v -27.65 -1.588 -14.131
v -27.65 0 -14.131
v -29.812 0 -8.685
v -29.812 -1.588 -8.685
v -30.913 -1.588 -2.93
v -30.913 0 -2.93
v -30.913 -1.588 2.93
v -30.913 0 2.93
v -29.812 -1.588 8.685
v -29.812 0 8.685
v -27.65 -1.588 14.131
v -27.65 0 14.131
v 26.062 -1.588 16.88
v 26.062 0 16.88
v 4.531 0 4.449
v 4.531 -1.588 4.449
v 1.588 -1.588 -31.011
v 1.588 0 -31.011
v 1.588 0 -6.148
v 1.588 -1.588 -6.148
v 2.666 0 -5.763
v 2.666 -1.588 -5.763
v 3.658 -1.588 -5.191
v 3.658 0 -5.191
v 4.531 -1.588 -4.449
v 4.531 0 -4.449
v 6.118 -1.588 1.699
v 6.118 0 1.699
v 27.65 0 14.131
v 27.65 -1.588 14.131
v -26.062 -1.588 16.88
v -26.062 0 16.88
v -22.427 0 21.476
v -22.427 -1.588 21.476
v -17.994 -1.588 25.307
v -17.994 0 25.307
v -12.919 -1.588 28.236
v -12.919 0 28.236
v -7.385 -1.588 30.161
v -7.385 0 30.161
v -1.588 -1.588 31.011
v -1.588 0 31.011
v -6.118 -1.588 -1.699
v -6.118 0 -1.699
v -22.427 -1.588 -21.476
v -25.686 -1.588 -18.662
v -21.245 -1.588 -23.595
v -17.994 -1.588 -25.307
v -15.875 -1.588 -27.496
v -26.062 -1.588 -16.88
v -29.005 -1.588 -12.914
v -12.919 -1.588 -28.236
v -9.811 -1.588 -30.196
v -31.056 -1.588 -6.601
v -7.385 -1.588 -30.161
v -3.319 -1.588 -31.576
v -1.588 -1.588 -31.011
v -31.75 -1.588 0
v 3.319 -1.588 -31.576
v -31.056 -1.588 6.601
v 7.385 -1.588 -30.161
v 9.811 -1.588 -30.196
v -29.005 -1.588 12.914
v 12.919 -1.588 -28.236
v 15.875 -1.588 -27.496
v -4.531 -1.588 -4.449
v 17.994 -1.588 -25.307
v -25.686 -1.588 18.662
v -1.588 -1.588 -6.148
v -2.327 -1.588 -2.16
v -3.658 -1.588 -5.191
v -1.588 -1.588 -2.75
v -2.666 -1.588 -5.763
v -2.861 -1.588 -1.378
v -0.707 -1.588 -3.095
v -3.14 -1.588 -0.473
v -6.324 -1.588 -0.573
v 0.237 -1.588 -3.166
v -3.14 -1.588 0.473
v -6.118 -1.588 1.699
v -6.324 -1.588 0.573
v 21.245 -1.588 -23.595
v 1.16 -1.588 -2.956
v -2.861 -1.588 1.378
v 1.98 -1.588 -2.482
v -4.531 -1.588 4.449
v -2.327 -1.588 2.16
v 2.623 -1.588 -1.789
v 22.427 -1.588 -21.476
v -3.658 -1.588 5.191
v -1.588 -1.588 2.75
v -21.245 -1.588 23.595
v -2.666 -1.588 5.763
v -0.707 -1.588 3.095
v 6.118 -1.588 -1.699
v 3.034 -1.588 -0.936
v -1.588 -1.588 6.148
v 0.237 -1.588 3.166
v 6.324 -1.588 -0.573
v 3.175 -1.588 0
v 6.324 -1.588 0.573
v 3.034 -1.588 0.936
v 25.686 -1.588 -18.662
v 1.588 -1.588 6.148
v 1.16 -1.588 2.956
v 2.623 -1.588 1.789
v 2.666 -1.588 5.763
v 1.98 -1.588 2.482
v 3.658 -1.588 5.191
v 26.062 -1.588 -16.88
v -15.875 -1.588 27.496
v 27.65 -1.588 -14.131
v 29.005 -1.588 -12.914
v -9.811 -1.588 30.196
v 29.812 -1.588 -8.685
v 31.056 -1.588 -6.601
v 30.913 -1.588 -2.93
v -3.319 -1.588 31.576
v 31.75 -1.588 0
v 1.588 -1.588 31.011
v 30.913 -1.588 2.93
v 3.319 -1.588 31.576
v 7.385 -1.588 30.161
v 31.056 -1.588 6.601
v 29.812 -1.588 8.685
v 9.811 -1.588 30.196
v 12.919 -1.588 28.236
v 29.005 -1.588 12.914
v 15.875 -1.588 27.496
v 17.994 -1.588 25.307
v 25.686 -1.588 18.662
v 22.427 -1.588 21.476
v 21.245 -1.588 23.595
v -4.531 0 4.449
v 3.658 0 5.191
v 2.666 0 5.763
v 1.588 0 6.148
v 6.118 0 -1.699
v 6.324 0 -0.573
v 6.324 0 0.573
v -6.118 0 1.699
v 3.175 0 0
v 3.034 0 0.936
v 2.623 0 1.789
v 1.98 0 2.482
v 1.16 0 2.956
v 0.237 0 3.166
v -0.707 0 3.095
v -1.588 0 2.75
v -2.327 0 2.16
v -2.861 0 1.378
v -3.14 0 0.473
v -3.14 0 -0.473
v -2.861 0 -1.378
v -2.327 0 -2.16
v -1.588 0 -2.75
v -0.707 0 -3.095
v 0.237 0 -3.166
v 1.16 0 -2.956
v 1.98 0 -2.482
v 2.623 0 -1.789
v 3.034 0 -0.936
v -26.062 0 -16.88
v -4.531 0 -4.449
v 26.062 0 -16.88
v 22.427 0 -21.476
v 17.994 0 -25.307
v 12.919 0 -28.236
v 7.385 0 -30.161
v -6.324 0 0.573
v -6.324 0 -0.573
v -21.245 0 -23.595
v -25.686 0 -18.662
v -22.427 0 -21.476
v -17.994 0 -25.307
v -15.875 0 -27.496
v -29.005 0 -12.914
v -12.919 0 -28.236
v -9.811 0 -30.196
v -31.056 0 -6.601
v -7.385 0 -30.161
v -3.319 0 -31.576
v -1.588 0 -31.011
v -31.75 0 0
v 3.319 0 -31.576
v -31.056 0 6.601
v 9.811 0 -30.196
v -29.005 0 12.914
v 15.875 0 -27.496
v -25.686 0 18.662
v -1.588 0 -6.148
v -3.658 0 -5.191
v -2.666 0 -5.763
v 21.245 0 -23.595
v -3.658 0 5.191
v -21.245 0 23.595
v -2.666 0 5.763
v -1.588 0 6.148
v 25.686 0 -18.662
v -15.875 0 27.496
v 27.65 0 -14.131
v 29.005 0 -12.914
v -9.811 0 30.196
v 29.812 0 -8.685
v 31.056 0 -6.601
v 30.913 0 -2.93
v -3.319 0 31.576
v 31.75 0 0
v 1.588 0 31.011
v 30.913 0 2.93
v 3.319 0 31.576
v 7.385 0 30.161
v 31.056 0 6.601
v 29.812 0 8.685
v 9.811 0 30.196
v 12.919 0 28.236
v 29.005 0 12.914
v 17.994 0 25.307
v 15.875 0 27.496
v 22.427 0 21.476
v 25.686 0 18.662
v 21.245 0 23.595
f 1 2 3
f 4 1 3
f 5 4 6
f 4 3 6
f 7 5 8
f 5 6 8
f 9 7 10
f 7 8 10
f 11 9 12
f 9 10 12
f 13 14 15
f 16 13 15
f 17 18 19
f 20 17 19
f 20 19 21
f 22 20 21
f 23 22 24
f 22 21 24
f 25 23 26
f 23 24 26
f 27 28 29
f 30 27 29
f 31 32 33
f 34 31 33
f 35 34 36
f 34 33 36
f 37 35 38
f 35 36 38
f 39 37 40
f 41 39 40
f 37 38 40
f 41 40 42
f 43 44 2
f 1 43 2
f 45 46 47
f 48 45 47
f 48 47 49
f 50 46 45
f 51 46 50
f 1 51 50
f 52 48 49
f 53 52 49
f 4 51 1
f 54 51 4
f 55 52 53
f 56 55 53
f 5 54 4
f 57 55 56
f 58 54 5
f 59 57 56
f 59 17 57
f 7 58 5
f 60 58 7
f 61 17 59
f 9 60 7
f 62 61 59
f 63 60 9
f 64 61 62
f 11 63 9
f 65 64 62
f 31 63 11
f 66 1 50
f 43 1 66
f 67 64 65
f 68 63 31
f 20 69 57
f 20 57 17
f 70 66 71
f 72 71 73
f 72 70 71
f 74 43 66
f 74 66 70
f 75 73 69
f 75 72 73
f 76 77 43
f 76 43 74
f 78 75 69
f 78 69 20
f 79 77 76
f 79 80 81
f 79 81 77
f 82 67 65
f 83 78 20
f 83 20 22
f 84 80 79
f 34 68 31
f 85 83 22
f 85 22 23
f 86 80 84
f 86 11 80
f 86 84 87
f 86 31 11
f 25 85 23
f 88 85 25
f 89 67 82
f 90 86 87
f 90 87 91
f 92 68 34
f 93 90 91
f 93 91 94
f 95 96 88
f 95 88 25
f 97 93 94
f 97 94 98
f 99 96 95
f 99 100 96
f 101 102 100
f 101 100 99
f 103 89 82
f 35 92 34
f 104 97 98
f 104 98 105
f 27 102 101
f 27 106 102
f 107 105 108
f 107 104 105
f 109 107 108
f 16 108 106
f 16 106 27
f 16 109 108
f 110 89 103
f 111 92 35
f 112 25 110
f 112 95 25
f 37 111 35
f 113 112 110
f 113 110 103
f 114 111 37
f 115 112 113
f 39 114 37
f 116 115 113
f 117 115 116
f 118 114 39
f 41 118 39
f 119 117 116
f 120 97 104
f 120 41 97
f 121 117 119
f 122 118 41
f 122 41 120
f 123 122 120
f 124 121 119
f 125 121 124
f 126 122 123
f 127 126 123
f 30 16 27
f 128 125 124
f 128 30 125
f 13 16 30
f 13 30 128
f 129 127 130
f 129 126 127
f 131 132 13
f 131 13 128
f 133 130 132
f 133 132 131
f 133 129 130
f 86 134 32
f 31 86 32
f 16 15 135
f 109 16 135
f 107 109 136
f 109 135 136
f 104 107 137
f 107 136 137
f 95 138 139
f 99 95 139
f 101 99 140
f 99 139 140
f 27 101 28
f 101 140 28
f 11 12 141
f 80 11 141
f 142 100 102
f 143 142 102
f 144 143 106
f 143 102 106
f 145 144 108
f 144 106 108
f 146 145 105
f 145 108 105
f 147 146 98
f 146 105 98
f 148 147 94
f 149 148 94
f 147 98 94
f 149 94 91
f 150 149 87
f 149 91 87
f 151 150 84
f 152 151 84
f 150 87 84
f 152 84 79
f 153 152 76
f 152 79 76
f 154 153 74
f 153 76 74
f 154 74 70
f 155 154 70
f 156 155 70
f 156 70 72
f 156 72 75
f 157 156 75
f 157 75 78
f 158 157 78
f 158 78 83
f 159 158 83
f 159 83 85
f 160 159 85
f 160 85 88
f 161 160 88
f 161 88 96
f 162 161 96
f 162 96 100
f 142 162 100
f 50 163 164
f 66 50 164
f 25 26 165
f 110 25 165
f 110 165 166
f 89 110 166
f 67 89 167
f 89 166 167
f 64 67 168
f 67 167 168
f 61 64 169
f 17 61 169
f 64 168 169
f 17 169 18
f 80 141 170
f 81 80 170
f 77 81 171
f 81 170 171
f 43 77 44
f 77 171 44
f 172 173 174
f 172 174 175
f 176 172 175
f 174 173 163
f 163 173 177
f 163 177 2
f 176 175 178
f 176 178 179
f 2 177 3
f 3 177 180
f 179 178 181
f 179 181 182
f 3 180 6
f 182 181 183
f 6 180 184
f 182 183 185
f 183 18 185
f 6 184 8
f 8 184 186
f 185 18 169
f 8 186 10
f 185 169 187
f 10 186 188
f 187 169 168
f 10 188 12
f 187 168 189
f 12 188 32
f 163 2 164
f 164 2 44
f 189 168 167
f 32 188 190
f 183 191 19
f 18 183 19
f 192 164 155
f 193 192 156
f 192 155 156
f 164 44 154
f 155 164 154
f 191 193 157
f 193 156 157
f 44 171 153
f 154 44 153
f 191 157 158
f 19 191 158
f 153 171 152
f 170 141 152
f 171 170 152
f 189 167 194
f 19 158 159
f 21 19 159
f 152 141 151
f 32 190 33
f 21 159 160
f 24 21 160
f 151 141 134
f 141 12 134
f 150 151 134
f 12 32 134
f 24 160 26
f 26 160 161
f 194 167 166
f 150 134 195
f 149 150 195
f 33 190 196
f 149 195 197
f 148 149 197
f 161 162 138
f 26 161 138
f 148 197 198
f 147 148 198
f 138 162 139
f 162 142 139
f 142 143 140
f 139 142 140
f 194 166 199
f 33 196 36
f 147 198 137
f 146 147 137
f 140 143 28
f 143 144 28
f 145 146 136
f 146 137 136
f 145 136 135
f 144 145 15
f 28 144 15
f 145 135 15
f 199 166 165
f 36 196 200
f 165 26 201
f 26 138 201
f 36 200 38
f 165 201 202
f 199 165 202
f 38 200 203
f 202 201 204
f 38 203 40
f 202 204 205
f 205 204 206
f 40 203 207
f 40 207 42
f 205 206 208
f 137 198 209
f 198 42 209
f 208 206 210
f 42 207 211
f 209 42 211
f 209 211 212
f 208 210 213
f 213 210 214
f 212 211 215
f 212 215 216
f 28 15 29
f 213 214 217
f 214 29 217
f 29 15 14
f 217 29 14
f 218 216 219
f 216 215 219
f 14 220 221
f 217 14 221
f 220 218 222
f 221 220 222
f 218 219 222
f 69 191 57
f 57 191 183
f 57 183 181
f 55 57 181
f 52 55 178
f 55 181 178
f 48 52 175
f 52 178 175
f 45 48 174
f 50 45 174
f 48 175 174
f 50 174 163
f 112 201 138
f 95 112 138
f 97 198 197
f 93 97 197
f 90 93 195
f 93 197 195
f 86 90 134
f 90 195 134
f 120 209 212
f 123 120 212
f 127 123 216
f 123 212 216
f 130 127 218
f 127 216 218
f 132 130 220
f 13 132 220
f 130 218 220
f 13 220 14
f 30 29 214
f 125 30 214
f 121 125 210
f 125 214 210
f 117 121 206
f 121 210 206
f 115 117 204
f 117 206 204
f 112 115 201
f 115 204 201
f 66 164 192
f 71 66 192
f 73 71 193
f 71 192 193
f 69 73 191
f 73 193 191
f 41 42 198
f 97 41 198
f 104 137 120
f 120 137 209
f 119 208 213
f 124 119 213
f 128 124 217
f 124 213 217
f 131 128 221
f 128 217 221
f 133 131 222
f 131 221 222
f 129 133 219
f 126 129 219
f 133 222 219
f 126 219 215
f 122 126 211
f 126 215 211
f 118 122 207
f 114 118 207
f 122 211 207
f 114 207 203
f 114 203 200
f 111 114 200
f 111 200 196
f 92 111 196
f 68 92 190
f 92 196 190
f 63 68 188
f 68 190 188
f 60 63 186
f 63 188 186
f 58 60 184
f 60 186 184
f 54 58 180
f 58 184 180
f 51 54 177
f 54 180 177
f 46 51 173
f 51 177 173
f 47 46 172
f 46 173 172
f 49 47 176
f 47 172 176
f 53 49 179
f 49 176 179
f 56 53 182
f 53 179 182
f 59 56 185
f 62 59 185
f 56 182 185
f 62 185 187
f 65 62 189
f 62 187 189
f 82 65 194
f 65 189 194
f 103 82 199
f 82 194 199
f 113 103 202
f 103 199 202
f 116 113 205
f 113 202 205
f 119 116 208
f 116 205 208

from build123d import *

# Parameters (mm, degrees)
F0_R     = 31.75
F1_DEPTH = 1.5875
F2_R     = 3.175
F3_DEPTH = 25.4


with BuildPart() as f1:
    # F0 (on Front) → F1 (new body)
    with BuildSketch(Plane.XZ):
        Circle(F0_R)
        with BuildLine():
            Line((-26.062471, -16.880262), (-4.530887, -4.448996))
            ThreePointArc((-4.530887, -4.448996), (-3.175, -5.499261), (-1.5875, -6.148361))
            Line((-1.5875, -6.148361), (-1.5875, -31.010893))
            ThreePointArc((-1.5875, -31.010893), (-15.52575, -26.891388), (-26.062471, -16.880262))
        make_face(mode=Mode.SUBTRACT)
        with BuildLine():
            ThreePointArc((1.5875, -6.148361), (3.175, -5.499261), (4.530887, -4.448996))
            Line((4.530887, -4.448996), (26.062471, -16.880262))
            ThreePointArc((26.062471, -16.880262), (15.52575, -26.891388), (1.5875, -31.010893))
            Line((1.5875, -31.010893), (1.5875, -6.148361))
        make_face(mode=Mode.SUBTRACT)
        with BuildLine():
            ThreePointArc((6.118387, -1.699365), (6.35, 0), (6.118387, 1.699365))
            Line((6.118387, 1.699365), (27.649971, 14.130631))
            ThreePointArc((27.649971, 14.130631), (31.0515, 0), (27.649971, -14.130631))
            Line((27.649971, -14.130631), (6.118387, -1.699365))
        make_face(mode=Mode.SUBTRACT)
        with BuildLine():
            ThreePointArc((-6.118387, 1.699365), (-6.35, 0), (-6.118387, -1.699365))
            Line((-6.118387, -1.699365), (-27.649971, -14.130631))
            ThreePointArc((-27.649971, -14.130631), (-31.0515, 0), (-27.649971, 14.130631))
            Line((-27.649971, 14.130631), (-6.118387, 1.699365))
        make_face(mode=Mode.SUBTRACT)
        with BuildLine():
            ThreePointArc((-26.062471, 16.880262), (-15.52575, 26.891388), (-1.5875, 31.010893))
            Line((-1.5875, 31.010893), (-1.5875, 6.148361))
            ThreePointArc((-1.5875, 6.148361), (-3.175, 5.499261), (-4.530887, 4.448996))
            Line((-4.530887, 4.448996), (-26.062471, 16.880262))
        make_face(mode=Mode.SUBTRACT)
        with BuildLine():
            ThreePointArc((4.530887, 4.448996), (3.175, 5.499261), (1.5875, 6.148361))
            Line((1.5875, 6.148361), (1.5875, 31.010893))
            ThreePointArc((1.5875, 31.010893), (15.52575, 26.891388), (26.062471, 16.880262))
            Line((26.062471, 16.880262), (4.530887, 4.448996))
        make_face(mode=Mode.SUBTRACT)
    extrude(amount=F1_DEPTH)

    # F2 (on face) → F3 (cut)
    with BuildSketch(Plane.XZ.offset(1.5875)):
        Circle(F2_R)
    extrude(amount=-F3_DEPTH, mode=Mode.SUBTRACT)


solid = f1.part
